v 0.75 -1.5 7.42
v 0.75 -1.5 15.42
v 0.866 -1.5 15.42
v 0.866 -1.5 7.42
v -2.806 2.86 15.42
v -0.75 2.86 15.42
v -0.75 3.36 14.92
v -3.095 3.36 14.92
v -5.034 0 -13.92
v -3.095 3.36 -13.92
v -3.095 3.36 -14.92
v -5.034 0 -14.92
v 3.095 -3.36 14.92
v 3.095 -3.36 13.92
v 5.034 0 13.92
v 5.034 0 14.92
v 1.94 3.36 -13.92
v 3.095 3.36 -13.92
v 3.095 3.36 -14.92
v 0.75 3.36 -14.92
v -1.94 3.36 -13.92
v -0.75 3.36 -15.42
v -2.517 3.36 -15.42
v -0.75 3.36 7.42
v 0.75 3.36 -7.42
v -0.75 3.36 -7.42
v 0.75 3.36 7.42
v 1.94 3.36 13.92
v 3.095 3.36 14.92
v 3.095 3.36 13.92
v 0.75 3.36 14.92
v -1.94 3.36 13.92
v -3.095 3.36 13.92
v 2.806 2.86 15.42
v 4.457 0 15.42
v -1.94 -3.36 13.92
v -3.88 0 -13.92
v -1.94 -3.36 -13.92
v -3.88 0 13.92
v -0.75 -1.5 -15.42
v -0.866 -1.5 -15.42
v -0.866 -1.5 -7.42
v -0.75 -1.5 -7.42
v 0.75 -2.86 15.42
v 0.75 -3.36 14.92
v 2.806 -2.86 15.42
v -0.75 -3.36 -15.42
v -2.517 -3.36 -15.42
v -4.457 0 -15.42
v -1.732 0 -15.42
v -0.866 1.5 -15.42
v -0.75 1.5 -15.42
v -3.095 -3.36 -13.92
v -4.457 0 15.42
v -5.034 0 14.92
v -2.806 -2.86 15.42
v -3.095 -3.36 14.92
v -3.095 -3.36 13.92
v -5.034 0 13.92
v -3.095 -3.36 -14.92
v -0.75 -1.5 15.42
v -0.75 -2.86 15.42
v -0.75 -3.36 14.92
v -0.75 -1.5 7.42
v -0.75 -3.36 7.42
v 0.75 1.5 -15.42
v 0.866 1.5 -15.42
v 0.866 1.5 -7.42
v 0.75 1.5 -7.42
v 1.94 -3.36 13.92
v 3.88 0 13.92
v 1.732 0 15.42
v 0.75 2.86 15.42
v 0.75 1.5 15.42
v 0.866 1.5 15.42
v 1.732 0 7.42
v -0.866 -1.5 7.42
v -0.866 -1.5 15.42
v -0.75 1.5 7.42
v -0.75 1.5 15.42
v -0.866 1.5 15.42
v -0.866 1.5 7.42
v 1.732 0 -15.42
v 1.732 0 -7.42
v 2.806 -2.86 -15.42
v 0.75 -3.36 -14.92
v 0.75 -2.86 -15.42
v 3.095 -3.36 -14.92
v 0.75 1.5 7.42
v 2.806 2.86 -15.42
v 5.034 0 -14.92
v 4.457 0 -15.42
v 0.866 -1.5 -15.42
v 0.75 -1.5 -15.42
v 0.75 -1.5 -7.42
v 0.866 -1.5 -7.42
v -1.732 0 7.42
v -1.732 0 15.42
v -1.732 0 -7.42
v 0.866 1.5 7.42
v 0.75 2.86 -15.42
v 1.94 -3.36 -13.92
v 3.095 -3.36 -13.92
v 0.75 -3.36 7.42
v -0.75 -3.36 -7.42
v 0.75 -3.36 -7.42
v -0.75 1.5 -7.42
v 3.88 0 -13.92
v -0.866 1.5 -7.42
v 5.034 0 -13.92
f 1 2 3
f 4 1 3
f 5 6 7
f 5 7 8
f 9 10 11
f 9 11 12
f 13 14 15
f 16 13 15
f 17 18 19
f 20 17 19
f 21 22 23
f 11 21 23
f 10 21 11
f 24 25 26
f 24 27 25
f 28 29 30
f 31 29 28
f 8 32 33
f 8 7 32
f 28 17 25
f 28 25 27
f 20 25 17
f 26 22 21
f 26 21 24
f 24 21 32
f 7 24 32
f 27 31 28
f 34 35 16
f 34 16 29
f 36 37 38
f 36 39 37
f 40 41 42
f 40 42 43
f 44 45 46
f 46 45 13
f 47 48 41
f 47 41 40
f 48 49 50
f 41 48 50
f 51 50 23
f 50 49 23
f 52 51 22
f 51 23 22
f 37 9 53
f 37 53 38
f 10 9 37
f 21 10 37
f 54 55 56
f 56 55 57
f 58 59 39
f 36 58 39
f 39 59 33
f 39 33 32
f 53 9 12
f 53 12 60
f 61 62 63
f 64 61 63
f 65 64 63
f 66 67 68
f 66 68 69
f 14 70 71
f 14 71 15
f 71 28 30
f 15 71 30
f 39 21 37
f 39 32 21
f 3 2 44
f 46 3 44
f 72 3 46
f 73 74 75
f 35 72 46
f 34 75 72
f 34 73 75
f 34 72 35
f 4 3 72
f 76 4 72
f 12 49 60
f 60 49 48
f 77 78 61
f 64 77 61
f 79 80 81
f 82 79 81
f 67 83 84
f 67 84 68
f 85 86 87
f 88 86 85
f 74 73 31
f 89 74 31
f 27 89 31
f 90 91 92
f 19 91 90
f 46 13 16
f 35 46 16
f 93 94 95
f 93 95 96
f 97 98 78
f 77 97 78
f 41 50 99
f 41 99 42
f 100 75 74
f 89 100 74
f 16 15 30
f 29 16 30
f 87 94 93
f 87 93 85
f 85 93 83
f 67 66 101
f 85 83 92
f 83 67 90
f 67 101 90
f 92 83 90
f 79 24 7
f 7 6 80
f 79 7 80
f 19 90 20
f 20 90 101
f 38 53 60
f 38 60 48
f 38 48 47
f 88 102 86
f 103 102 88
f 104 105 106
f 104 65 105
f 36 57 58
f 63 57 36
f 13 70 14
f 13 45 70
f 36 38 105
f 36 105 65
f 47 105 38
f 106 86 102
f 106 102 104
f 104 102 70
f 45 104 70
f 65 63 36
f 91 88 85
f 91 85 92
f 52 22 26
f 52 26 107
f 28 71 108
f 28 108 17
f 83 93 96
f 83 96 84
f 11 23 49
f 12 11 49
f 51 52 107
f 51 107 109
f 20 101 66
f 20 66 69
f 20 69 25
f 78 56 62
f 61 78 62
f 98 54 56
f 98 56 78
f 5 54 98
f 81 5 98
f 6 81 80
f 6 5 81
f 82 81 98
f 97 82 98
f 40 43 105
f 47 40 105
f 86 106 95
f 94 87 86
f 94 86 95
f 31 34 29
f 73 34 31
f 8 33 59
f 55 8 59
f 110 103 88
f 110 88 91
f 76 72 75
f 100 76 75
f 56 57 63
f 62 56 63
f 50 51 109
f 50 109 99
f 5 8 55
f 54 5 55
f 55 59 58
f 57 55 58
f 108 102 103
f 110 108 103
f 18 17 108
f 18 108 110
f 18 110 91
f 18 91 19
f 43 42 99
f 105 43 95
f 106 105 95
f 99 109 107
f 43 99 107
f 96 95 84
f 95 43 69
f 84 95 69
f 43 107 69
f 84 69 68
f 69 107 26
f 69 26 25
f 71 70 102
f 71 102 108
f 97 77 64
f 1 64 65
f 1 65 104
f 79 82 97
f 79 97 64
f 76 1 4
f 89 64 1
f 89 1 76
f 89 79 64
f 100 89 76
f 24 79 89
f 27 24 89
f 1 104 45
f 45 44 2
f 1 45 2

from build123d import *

# Parameters (mm, degrees)
BOSS_EXTRU_1_DEPTH      = 13.92
BOSS_EXTRU_2_DEPTH      = 1.5
ESQUISSE4_W             = 1.5
ESQUISSE4_H             = 0.855256697
ESQUISSE4_H_2           = 1.86
ESQUISSE4_H_3           = 3
ENL_V_MAT_EXTRU_1_DEPTH = 8
CHANFREIN1_SIZE         = 0.5


with BuildPart() as part:
    # Esquisse1 → Boss.-Extru.1 (new, symmetric)
    with BuildSketch(Plane(origin=(0, 0, 0), x_dir=(0, 1, 0), z_dir=(0, 0, 1))):
        Polygon((0, 3.879793809), (-3.36, 1.939896904), (-3.36, -1.939896904), (0, -3.879793809), (3.36, -1.939896904), (3.36, 1.939896904), align=None)
    extrude(amount=BOSS_EXTRU_1_DEPTH, both=True)

    # Esquisse2 → Boss.-Extru.2 (add)
    with BuildSketch(Plane.XY.offset(13.92)):
        Polygon((-1.939896904, 3.36), (-3.094597443, 3.36), (-5.034494347, 0), (-3.094597443, -3.36), (-1.939896904, -3.36), (-3.879793809, 0), align=None)
        Polygon((3.094597443, 3.36), (1.939896904, 3.36), (3.879793809, 0), (1.939896904, -3.36), (3.094597443, -3.36), (5.034494347, 0), align=None)
        Polygon((1.939896904, 3.36), (-1.939896904, 3.36), (-3.879793809, 0), (-1.939896904, -3.36), (1.939896904, -3.36), (3.879793809, 0), align=None)
    boss_extru_2 = extrude(amount=BOSS_EXTRU_2_DEPTH)

    # Esquisse4 → Enlèv. mat.-Extru.1 (cut)
    with BuildSketch(Plane.XY.offset(15.42)):
        with Locations((0, 3.787628349)):
            Rectangle(ESQUISSE4_W, ESQUISSE4_H)
        with Locations((0, 2.43)):
            Rectangle(ESQUISSE4_W, ESQUISSE4_H_2)
        Rectangle(ESQUISSE4_W, ESQUISSE4_H_3)
        with Locations((0, -2.43)):
            Rectangle(ESQUISSE4_W, ESQUISSE4_H_2)
        Polygon((0.75, 1.5), (0.75, -1.5), (0.866025404, -1.5), (1.732050808, 0), (0.866025404, 1.5), align=None)
        Polygon((-0.866025404, 1.5), (-1.732050808, 0), (-0.866025404, -1.5), (-0.75, -1.5), (-0.75, 1.5), align=None)
    enl_v_mat_extru_1 = extrude(amount=-ENL_V_MAT_EXTRU_1_DEPTH, mode=Mode.SUBTRACT)

    # Symétrie2: Boss.-Extru.2, Enlèv. mat.-Extru.1 across plane
    add(boss_extru_2.mirror(Plane.XY))
    add(enl_v_mat_extru_1.mirror(Plane.XY), mode=Mode.SUBTRACT)

    # Chanfrein1
    chanfrein1_edges = [part.edges().sort_by_distance(p)[0] for p in [
        (1.922298721, -3.36, -15.42),
        (1.922298721, 3.36, -15.42),
        (-1.922298721, 3.36, 15.42),
        (-1.922298721, -3.36, 15.42),
        (4.064545895, -1.68, 15.42),
        (4.064545895, 1.68, 15.42),
        (-4.064545895, 1.68, 15.42),
        (-4.064545895, -1.68, 15.42),
        (1.922298721, -3.36, 15.42),
        (1.922298721, 3.36, 15.42),
        (-4.064545895, -1.68, -15.42),
        (-4.064545895, 1.68, -15.42),
        (4.064545895, 1.68, -15.42),
        (4.064545895, -1.68, -15.42),
    ]]
    chamfer(chanfrein1_edges, length=CHANFREIN1_SIZE)


solid = part.part
